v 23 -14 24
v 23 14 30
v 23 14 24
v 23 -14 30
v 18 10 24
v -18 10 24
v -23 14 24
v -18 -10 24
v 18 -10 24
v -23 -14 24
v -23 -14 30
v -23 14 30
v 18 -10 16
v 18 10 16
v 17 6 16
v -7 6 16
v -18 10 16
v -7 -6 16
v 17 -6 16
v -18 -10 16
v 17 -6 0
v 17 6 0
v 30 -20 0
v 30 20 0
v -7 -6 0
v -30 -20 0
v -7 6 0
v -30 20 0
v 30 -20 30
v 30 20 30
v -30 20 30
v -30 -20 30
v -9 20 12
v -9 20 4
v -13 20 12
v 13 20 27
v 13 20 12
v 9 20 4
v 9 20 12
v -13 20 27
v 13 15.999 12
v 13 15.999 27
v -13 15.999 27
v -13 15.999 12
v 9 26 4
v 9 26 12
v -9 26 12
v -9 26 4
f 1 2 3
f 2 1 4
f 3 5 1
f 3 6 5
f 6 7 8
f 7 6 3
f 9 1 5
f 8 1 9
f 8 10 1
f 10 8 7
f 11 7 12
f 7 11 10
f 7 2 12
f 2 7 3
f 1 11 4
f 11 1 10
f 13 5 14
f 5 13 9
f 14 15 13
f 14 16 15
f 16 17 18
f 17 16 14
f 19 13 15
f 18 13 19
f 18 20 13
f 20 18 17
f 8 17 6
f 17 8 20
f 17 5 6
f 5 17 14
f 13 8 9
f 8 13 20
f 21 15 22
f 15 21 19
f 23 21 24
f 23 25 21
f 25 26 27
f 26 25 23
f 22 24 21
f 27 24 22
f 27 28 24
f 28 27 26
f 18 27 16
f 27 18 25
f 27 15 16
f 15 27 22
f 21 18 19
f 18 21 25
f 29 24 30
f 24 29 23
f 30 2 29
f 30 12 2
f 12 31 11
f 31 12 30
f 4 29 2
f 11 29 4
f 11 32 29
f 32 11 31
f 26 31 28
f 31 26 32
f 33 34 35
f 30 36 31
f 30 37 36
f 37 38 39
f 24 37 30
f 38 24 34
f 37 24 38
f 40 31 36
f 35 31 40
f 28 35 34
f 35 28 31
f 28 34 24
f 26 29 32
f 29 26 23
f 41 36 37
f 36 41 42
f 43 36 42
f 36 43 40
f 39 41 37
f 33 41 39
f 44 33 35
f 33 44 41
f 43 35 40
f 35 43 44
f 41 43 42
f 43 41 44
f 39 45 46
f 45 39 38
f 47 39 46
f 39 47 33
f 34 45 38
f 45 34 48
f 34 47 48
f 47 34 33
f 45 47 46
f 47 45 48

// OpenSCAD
// ============================================================
// Parametric stepped cavity box with side projection & recess
// All dimensions in millimeters
// ============================================================

// ---- Main body parameters ----
body_w = 60;          // outer width (X)
body_d = 40;          // outer depth (Y)
body_h = 30;          // outer height (Z)

wall = 3;             // wall thickness of the top rim
bottom_t = 4;         // solid bottom thickness
corner_fn = 0;        // (no rounding, kept simple)

// ---- Stepped cavity parameters ----
step1_w = 46;         // upper recess width
step1_d = 28;         // upper recess depth (Y)
step1_h = 6;          // upper recess height

step2_w = 36;         // middle recess width
step2_d = 20;         // middle recess depth (Y)
step2_h = 8;          // middle recess height

// Deepest pocket - shifted to one side (+X)
pocket_w = 24;
pocket_d = 12;
pocket_h = 10;        // extends down to bottom slab only
pocket_x_shift = 5;   // offset toward +X side

$fn = 64;

// ---- Side boss (projection) parameters ----
boss_w  = 18;         // projection width (X)
boss_t  = 6;          // projection length outward (Y)
boss_h  = 8;          // projection height (Z)
boss_z  = bottom_t;   // sits just above the base

// ---- Related side recess above the boss ----
side_recess_w = 26;   // recess width (X) in side wall
side_recess_depth = 4; // cut into the wall (Y)
side_recess_z_min = boss_z + boss_h;      // starts at boss top
side_recess_z_max = body_h - wall;        // ends under the rim


// ------------------------------------------------------------
// Module: plain rectangular block centered on Z=0 base reference
// ------------------------------------------------------------
module box(w, d, h) {
    translate([-w/2, -d/2, 0])
        cube([w, d, h]);
}

// ------------------------------------------------------------
// Module: nested stepped cavity cuts (subtracted from body)
// Cavity positions are relative to the TOP face and descend.
// ------------------------------------------------------------
module stepped_cavity() {
    z_top = body_h;                       // top face height

    // Upper broad recess (leaves the rim wall)
    translate([0, 0, z_top - step1_h])
        box(step1_w, step1_d, step1_h + 1); // +1 to punch through top

    // Middle inset step
    translate([0, 0, z_top - step1_h - step2_h])
        box(step2_w, step2_d, step2_h);

    // Deepest pocket, shifted to +X side
    translate([pocket_x_shift, 0, 0])
        box(pocket_w, pocket_d,
            body_h - bottom_t);
}

// ------------------------------------------------------------
// Module: side recess cut into one side wall (above the boss)
// ------------------------------------------------------------
module side_recess() {
    translate([-side_recess_w/2,
               body_d/2 - side_recess_depth - 0.001,
               side_recess_z_min])
        cube([side_recess_w,
              side_recess_depth + 1,
              side_recess_z_max - side_recess_z_min]);
}

// ------------------------------------------------------------
// Main model: difference the cavities from a solid block,
// then union the external projection.
// ------------------------------------------------------------
difference() {
    // Solid rectangular main body
    box(body_w, body_d, body_h);

    // Cut the nested stepped interior cavity from the top
    stepped_cavity();

    // Cut the recess in the side wall above the boss tier
    side_recess();
}

// Add the rectangular solid projection along the front side,
// directly below the side recess (creates a stepped side tier)
translate([-boss_w/2, body_d/2, boss_z])
    cube([boss_w, boss_t, boss_h]);
